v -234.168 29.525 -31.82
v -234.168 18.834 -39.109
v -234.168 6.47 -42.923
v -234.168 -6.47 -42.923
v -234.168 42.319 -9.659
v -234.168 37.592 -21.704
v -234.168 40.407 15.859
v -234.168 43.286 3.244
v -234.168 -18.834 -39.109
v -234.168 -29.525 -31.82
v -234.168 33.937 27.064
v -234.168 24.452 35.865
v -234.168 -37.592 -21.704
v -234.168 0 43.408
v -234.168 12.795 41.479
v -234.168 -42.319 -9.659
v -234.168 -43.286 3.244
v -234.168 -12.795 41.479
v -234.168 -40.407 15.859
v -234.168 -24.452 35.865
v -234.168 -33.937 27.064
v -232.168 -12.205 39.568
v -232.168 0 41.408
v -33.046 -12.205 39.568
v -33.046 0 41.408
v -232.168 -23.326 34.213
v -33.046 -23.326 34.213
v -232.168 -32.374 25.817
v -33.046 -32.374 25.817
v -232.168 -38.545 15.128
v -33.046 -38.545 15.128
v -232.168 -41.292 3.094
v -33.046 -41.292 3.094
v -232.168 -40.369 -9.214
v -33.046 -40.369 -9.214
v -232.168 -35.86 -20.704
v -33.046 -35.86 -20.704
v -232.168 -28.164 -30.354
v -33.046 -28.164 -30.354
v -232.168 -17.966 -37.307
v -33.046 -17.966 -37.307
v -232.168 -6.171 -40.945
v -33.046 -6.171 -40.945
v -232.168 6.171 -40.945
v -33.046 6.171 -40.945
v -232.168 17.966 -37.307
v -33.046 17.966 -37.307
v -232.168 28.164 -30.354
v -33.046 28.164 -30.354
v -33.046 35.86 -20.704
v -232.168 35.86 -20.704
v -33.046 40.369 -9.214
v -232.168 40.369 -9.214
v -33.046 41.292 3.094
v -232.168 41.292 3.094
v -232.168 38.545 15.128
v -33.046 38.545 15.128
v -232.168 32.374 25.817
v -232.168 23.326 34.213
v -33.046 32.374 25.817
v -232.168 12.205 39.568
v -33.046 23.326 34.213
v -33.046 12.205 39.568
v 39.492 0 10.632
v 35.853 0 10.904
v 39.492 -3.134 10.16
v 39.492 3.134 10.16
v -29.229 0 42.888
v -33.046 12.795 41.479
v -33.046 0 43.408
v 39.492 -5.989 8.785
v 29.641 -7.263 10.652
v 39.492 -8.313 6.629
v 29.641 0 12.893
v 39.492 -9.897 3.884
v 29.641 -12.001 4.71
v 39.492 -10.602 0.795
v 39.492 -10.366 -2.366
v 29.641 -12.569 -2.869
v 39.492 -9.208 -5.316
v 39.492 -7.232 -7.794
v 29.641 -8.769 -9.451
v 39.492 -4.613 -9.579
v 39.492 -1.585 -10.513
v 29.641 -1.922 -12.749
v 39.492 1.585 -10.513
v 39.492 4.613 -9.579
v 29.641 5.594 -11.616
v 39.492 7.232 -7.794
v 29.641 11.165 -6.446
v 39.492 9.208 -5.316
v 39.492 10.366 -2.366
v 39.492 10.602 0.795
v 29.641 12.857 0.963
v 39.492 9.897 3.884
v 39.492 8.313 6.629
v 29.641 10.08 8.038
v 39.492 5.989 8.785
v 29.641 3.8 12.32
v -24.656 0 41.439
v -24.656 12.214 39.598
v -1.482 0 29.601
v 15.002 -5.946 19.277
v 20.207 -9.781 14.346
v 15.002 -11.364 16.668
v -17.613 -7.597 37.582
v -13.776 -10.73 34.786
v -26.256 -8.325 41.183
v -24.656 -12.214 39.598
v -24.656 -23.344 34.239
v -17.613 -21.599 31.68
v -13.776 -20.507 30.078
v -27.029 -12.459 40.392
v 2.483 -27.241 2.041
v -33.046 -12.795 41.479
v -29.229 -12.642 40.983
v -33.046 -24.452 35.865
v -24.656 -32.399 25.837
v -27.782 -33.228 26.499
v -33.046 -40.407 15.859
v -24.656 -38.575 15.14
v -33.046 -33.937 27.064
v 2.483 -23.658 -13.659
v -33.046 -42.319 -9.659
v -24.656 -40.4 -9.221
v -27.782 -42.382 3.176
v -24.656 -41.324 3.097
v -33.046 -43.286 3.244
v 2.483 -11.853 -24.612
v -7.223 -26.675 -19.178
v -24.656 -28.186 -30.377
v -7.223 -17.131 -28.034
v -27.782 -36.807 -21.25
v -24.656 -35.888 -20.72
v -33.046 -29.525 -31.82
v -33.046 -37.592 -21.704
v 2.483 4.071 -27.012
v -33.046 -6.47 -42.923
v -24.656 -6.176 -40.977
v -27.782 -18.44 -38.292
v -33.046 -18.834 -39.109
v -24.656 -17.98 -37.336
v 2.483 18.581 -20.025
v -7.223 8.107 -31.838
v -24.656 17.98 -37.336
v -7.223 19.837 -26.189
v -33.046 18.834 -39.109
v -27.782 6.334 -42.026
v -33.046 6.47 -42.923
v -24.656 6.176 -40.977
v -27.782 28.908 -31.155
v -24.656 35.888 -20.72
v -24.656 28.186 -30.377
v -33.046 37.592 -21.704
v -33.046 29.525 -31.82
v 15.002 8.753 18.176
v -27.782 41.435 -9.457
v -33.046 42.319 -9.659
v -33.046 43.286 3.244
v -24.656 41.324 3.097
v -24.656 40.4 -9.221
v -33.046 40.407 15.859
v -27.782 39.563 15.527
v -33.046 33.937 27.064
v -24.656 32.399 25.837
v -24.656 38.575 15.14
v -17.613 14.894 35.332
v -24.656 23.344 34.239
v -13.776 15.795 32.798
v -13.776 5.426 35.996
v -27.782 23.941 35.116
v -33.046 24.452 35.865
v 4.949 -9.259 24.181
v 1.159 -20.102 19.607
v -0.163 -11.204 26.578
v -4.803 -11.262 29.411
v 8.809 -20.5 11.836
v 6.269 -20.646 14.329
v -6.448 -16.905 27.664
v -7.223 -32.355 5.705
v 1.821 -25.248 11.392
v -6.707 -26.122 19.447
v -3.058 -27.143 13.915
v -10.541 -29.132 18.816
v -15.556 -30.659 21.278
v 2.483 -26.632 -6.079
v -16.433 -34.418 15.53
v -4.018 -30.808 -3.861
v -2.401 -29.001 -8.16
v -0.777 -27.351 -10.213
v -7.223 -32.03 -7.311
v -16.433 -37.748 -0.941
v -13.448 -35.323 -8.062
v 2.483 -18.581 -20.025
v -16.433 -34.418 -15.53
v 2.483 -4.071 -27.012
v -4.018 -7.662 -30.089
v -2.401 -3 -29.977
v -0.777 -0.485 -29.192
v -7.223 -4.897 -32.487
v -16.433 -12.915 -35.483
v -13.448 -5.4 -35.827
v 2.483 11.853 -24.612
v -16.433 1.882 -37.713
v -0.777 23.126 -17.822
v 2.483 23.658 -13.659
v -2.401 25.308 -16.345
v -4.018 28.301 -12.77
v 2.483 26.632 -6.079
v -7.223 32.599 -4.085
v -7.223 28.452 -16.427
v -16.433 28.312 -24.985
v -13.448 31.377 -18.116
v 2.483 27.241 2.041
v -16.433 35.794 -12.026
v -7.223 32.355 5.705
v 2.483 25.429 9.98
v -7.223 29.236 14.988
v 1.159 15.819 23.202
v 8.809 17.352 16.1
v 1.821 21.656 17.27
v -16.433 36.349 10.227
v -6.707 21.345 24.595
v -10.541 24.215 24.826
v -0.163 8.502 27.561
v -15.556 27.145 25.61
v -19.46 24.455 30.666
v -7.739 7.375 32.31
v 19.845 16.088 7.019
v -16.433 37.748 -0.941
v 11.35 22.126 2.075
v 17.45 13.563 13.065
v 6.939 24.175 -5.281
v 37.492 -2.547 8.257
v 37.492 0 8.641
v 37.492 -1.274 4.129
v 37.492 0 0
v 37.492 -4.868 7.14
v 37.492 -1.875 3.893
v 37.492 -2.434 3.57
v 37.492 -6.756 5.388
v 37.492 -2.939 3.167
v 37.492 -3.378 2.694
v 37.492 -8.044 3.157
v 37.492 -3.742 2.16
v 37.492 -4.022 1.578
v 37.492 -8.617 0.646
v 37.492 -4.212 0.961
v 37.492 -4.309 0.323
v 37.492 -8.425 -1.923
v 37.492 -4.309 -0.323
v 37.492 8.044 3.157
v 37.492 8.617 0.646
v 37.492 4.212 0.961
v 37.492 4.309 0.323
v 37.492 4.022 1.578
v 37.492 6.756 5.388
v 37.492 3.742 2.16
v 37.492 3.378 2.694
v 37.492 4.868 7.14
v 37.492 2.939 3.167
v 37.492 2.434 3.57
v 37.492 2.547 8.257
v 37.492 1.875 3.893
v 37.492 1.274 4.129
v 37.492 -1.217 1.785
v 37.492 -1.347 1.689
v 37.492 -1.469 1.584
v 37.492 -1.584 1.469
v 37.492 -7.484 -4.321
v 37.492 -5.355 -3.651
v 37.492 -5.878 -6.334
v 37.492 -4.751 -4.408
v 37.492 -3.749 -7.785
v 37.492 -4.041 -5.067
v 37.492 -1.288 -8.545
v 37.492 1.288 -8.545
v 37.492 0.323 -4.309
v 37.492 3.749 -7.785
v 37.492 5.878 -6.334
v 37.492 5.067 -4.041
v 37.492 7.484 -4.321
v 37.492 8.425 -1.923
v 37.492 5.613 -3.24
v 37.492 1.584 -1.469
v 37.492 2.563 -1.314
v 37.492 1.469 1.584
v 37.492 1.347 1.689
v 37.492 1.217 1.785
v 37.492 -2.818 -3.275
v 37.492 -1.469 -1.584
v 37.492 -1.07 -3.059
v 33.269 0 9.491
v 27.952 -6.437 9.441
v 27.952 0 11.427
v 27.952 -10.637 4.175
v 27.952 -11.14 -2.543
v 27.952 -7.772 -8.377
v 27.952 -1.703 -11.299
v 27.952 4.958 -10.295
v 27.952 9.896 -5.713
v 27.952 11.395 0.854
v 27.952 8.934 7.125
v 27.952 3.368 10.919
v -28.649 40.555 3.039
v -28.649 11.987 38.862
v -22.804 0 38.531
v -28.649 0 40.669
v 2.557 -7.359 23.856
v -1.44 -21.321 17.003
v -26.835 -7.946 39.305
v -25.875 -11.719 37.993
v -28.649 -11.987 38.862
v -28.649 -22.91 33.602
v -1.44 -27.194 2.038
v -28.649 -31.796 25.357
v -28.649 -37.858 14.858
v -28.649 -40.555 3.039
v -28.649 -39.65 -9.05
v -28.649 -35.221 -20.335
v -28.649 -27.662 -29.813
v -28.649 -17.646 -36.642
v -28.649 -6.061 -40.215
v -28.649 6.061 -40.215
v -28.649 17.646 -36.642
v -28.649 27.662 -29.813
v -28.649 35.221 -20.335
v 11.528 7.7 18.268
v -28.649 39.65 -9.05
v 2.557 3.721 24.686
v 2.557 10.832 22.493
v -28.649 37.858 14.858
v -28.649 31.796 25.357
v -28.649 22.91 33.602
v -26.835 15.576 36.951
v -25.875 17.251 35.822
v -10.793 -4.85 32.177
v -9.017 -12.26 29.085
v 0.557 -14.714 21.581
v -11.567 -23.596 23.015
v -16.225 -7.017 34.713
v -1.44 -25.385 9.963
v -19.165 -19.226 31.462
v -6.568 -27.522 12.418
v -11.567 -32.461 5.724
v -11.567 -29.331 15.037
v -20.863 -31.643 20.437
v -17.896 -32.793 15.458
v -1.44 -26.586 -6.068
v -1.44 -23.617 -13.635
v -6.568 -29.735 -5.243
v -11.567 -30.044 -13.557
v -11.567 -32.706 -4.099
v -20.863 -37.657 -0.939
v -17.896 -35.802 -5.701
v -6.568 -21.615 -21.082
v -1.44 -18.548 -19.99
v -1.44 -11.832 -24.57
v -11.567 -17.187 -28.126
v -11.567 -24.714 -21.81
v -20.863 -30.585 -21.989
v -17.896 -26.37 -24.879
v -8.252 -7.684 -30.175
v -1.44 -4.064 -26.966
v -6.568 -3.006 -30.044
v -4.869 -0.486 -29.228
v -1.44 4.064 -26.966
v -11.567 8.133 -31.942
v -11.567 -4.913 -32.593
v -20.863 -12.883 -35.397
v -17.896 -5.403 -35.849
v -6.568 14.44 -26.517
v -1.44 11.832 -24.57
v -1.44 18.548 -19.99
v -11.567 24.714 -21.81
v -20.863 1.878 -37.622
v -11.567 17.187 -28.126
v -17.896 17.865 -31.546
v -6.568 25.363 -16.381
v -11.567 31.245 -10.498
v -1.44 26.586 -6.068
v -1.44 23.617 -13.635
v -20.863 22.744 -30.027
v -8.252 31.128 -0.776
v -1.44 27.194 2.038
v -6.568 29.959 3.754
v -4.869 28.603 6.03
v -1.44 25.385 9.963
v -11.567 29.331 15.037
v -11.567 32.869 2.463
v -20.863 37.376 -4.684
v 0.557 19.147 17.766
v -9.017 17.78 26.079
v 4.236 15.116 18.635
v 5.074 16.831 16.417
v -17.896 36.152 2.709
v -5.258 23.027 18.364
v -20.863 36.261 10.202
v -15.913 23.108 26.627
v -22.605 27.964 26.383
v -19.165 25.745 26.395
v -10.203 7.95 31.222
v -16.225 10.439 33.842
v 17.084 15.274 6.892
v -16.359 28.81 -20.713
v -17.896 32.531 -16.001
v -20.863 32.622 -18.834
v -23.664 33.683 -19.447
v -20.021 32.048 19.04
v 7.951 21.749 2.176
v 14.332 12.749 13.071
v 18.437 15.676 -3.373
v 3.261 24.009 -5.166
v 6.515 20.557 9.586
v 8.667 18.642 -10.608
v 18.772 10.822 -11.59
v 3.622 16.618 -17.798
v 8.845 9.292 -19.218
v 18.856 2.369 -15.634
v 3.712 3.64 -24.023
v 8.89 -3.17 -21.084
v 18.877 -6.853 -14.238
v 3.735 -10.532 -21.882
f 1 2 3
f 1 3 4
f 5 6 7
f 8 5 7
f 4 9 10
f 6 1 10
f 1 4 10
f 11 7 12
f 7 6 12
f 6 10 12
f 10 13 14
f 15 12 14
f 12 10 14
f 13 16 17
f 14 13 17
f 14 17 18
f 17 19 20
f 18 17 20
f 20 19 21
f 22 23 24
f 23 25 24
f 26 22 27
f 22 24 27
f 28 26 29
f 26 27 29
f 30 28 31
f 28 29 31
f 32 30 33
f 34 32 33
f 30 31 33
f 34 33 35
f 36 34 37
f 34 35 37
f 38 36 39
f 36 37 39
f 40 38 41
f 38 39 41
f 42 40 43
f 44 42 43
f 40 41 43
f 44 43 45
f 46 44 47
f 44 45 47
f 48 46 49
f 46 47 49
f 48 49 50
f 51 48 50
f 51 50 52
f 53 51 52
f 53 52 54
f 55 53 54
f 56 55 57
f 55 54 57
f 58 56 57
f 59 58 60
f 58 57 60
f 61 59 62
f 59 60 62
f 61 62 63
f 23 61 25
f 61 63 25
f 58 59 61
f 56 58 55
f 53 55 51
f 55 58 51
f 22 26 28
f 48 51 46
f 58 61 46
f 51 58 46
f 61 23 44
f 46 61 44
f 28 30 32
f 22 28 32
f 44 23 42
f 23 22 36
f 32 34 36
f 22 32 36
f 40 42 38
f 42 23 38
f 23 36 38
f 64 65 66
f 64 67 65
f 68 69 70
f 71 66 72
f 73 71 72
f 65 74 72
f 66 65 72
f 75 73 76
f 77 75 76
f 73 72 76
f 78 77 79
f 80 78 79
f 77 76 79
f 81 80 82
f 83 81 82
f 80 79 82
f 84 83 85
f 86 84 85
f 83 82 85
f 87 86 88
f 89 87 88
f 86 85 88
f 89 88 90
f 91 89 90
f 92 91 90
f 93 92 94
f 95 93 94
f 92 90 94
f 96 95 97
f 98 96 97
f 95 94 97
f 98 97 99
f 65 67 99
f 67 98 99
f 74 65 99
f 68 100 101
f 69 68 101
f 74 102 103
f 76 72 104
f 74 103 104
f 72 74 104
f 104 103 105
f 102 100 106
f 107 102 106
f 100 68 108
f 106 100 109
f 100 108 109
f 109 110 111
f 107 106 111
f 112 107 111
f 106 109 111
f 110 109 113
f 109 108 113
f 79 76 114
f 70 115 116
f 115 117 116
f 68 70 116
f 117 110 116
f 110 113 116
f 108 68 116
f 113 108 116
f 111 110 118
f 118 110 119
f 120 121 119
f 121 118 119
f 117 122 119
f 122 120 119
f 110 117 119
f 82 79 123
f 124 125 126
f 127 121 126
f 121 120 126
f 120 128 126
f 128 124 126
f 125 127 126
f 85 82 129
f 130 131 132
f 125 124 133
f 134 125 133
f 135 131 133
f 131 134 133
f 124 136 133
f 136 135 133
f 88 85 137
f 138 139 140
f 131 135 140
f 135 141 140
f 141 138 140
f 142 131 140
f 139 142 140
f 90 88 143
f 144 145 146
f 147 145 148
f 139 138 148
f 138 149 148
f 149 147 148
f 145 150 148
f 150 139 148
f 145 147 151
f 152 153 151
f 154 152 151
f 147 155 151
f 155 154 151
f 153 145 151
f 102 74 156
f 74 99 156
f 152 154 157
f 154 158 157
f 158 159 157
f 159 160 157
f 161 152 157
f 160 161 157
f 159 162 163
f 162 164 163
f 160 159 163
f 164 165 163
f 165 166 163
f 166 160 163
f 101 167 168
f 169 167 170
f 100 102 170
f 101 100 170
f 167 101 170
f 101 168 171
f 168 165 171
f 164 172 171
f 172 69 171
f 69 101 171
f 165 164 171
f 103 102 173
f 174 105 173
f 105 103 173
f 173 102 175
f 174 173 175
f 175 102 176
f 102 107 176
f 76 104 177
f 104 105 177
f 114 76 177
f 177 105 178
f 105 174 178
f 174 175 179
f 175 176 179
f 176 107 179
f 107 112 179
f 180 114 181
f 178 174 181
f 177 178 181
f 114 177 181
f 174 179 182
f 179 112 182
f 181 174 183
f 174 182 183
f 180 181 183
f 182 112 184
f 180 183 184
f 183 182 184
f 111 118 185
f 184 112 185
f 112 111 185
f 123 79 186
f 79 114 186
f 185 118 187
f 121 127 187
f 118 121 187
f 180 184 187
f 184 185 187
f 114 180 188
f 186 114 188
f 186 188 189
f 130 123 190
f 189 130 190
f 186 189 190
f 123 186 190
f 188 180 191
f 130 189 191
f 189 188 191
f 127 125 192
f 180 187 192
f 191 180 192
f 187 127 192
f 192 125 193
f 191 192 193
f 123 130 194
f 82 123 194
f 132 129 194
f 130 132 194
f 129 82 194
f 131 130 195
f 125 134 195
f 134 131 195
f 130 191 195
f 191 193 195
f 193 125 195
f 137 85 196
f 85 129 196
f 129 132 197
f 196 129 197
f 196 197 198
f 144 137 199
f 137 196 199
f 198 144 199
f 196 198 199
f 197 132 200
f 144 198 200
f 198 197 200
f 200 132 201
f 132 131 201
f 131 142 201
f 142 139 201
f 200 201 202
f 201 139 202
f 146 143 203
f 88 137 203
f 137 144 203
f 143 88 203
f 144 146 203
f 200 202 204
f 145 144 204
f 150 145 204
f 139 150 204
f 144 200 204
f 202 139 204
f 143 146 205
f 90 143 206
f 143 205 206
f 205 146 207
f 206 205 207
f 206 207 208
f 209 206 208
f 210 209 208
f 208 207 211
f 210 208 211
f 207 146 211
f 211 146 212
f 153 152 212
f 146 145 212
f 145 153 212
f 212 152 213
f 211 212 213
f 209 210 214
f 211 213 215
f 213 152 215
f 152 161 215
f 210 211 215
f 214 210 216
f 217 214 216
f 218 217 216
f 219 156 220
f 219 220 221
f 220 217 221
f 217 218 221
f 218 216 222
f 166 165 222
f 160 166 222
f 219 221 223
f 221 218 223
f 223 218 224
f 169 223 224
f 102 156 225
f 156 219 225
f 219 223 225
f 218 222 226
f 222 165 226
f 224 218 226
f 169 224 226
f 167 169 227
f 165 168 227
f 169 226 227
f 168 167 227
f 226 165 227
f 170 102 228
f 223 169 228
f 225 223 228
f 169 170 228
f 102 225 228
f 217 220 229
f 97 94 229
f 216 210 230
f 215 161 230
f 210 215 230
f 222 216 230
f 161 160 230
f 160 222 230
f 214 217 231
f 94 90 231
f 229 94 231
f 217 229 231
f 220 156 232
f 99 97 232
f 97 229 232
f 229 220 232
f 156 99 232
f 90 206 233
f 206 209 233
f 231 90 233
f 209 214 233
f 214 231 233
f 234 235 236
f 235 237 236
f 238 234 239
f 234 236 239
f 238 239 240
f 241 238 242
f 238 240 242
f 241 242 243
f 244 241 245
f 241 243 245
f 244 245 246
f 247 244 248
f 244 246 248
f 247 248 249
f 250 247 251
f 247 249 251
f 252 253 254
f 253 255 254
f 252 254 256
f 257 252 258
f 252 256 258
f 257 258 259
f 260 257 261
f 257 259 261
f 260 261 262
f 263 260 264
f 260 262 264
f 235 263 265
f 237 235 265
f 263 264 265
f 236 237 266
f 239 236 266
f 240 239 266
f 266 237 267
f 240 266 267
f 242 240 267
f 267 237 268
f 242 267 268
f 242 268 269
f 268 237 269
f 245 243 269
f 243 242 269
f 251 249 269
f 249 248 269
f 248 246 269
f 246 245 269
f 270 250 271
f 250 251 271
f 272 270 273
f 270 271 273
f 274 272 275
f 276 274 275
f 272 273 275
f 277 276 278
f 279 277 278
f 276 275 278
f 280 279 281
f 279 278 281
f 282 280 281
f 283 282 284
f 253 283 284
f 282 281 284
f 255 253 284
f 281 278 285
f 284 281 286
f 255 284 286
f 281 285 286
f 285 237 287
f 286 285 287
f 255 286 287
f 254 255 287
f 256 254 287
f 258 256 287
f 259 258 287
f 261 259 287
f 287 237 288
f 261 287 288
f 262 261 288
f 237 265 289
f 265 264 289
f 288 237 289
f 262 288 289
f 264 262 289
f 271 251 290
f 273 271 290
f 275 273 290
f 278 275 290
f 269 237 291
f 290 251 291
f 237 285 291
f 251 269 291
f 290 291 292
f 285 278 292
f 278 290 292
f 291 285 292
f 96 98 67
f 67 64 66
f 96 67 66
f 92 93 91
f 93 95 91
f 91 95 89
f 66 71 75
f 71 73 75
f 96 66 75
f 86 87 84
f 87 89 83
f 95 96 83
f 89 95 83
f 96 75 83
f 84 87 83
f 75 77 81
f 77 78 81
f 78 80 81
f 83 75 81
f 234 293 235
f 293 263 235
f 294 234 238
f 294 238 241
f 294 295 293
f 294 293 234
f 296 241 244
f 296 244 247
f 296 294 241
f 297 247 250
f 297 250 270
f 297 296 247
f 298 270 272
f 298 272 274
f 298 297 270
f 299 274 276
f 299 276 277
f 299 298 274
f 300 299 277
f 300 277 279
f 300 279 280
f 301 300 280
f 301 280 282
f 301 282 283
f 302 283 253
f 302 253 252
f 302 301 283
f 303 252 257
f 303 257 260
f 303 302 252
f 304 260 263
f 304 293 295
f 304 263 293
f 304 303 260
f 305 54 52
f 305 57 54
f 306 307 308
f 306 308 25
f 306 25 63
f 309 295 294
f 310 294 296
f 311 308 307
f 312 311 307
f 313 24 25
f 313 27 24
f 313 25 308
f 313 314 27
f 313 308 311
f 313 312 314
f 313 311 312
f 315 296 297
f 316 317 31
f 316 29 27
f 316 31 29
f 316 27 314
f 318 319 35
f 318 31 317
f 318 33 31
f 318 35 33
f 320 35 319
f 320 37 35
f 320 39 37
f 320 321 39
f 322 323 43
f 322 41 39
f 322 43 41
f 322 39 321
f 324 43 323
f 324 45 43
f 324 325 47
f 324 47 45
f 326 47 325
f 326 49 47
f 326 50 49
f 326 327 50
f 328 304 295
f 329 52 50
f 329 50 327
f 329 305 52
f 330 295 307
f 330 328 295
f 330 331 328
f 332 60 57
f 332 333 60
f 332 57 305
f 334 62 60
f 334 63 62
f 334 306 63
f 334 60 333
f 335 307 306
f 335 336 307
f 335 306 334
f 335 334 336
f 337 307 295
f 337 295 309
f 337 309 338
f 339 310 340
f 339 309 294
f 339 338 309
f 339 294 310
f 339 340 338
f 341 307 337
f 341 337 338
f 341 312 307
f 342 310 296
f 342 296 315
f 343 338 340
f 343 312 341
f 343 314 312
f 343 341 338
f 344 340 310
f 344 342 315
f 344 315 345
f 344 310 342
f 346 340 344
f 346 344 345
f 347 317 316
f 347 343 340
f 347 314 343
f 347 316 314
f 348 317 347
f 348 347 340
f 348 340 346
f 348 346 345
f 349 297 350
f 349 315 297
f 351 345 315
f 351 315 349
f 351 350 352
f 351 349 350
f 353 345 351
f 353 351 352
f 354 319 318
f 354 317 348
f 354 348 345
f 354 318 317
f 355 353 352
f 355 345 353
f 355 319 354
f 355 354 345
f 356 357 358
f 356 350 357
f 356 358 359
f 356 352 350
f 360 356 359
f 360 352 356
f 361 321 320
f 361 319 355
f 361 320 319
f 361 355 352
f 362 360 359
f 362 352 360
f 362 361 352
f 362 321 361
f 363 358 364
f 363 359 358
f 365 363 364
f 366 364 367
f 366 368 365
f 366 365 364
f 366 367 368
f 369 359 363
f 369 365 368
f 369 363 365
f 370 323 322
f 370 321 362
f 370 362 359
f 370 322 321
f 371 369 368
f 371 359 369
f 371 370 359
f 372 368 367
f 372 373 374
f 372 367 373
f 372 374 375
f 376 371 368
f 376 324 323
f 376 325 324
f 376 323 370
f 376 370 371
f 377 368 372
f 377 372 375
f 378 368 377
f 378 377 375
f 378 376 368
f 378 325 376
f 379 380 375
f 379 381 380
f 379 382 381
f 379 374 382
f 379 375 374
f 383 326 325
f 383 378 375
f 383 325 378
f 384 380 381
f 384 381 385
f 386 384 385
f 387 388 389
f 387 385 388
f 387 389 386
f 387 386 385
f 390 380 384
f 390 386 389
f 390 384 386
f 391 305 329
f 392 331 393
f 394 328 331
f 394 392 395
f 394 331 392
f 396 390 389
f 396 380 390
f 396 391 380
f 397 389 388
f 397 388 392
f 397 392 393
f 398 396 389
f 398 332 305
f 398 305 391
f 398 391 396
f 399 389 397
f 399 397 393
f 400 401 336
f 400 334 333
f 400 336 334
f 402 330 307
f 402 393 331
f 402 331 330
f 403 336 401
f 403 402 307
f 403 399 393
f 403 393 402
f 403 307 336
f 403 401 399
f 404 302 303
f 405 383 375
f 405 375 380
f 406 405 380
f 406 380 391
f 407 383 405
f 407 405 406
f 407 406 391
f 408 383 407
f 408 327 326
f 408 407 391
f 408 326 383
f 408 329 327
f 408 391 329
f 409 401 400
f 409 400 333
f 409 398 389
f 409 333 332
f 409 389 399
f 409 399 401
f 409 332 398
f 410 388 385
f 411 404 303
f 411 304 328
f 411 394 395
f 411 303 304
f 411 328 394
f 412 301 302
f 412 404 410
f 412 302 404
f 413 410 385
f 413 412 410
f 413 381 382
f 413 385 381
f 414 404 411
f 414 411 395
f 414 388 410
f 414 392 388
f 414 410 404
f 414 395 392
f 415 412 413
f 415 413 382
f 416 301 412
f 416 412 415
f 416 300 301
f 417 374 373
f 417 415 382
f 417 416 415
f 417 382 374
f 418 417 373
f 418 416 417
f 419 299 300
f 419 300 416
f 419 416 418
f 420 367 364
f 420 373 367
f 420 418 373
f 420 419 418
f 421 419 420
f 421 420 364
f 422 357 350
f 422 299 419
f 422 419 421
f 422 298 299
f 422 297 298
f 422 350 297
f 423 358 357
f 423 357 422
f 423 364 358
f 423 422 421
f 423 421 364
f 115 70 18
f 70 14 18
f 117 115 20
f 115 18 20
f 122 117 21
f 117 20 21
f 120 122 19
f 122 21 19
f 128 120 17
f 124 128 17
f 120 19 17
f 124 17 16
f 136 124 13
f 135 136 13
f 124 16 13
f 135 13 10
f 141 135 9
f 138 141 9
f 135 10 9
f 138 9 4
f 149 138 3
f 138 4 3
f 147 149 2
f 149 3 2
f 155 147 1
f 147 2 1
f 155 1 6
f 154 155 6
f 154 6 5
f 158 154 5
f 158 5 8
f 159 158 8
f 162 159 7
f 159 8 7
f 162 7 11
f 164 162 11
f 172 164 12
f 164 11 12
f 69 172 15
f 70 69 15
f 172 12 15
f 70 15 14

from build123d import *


# Not quite as in the source:
# - ends of sketch curves that miss each other by under 0.0002 mm in the source are joined
# - the dataset's text gives a spline's control points without its knots; the knots are read off the source's solid


with BuildPart() as f1:
    # F0 (on Front) → F1 (revolve)
    with BuildSketch(Plane.XZ):
        with BuildLine():
            Line((37.4922007322, 0), (39.4921973348, 0))
            Line((39.4921973348, 0), (39.4921973348, 10.6321773492))
            add(Edge.make_bspline(
                [(39.4921973348, 10.6321773492), (25.8319638669, 9.223905392), (-17.5490600107, 43.4075947851), (-33.0458087847, 43.4075947851)],
                knots=[0, 0, 0, 0, 79.598934163, 79.598934163, 79.598934163, 79.598934163], degree=3))
            Line((-33.0458087847, 43.4075947851), (-234.167508781, 43.4075947851))
            Line((-234.167508781, 43.4075947851), (-234.167508781, 0))
            Line((-234.167508781, 0), (-232.1675121784, 0))
            Line((-232.1675121784, 0), (-232.1675121784, 41.4075981826))
            Line((-232.1675121784, 41.4075981826), (-33.0458087847, 41.4075981826))
            add(Edge.make_bspline(
                [(37.4922013196, 8.6412238335), (37.0945770822, 8.6758484487), (35.5138249558, 8.8768940457), (32.5543086746, 9.6271891204), (28.3485189273, 11.2022557551), (22.229588287, 13.9850146115), (13.76876914, 18.4938124906), (2.9175771692, 24.7537479723), (-7.9699760264, 31.0509027544), (-16.502875169, 35.6449766342), (-22.6377369359, 38.5118930501), (-26.788697304, 40.1529468803), (-30.3678361719, 41.1839581397), (-32.2610835082, 41.4075981826), (-33.0458087847, 41.4075981826)],
                knots=[0.0410074938, 0.0410074938, 0.0410074938, 0.0410074938, 0.0625, 0.125, 0.1875, 0.25, 0.375, 0.5, 0.625, 0.75, 0.8125, 0.875, 0.9375, 1, 1, 1, 1], degree=3))
            Line((37.4922013196, 8.6412238335), (37.4922007322, 0))
        make_face()
    revolve(axis=Axis((-25.0741094351, 0, 0), (1, 0, 0)))


solid = f1.part
